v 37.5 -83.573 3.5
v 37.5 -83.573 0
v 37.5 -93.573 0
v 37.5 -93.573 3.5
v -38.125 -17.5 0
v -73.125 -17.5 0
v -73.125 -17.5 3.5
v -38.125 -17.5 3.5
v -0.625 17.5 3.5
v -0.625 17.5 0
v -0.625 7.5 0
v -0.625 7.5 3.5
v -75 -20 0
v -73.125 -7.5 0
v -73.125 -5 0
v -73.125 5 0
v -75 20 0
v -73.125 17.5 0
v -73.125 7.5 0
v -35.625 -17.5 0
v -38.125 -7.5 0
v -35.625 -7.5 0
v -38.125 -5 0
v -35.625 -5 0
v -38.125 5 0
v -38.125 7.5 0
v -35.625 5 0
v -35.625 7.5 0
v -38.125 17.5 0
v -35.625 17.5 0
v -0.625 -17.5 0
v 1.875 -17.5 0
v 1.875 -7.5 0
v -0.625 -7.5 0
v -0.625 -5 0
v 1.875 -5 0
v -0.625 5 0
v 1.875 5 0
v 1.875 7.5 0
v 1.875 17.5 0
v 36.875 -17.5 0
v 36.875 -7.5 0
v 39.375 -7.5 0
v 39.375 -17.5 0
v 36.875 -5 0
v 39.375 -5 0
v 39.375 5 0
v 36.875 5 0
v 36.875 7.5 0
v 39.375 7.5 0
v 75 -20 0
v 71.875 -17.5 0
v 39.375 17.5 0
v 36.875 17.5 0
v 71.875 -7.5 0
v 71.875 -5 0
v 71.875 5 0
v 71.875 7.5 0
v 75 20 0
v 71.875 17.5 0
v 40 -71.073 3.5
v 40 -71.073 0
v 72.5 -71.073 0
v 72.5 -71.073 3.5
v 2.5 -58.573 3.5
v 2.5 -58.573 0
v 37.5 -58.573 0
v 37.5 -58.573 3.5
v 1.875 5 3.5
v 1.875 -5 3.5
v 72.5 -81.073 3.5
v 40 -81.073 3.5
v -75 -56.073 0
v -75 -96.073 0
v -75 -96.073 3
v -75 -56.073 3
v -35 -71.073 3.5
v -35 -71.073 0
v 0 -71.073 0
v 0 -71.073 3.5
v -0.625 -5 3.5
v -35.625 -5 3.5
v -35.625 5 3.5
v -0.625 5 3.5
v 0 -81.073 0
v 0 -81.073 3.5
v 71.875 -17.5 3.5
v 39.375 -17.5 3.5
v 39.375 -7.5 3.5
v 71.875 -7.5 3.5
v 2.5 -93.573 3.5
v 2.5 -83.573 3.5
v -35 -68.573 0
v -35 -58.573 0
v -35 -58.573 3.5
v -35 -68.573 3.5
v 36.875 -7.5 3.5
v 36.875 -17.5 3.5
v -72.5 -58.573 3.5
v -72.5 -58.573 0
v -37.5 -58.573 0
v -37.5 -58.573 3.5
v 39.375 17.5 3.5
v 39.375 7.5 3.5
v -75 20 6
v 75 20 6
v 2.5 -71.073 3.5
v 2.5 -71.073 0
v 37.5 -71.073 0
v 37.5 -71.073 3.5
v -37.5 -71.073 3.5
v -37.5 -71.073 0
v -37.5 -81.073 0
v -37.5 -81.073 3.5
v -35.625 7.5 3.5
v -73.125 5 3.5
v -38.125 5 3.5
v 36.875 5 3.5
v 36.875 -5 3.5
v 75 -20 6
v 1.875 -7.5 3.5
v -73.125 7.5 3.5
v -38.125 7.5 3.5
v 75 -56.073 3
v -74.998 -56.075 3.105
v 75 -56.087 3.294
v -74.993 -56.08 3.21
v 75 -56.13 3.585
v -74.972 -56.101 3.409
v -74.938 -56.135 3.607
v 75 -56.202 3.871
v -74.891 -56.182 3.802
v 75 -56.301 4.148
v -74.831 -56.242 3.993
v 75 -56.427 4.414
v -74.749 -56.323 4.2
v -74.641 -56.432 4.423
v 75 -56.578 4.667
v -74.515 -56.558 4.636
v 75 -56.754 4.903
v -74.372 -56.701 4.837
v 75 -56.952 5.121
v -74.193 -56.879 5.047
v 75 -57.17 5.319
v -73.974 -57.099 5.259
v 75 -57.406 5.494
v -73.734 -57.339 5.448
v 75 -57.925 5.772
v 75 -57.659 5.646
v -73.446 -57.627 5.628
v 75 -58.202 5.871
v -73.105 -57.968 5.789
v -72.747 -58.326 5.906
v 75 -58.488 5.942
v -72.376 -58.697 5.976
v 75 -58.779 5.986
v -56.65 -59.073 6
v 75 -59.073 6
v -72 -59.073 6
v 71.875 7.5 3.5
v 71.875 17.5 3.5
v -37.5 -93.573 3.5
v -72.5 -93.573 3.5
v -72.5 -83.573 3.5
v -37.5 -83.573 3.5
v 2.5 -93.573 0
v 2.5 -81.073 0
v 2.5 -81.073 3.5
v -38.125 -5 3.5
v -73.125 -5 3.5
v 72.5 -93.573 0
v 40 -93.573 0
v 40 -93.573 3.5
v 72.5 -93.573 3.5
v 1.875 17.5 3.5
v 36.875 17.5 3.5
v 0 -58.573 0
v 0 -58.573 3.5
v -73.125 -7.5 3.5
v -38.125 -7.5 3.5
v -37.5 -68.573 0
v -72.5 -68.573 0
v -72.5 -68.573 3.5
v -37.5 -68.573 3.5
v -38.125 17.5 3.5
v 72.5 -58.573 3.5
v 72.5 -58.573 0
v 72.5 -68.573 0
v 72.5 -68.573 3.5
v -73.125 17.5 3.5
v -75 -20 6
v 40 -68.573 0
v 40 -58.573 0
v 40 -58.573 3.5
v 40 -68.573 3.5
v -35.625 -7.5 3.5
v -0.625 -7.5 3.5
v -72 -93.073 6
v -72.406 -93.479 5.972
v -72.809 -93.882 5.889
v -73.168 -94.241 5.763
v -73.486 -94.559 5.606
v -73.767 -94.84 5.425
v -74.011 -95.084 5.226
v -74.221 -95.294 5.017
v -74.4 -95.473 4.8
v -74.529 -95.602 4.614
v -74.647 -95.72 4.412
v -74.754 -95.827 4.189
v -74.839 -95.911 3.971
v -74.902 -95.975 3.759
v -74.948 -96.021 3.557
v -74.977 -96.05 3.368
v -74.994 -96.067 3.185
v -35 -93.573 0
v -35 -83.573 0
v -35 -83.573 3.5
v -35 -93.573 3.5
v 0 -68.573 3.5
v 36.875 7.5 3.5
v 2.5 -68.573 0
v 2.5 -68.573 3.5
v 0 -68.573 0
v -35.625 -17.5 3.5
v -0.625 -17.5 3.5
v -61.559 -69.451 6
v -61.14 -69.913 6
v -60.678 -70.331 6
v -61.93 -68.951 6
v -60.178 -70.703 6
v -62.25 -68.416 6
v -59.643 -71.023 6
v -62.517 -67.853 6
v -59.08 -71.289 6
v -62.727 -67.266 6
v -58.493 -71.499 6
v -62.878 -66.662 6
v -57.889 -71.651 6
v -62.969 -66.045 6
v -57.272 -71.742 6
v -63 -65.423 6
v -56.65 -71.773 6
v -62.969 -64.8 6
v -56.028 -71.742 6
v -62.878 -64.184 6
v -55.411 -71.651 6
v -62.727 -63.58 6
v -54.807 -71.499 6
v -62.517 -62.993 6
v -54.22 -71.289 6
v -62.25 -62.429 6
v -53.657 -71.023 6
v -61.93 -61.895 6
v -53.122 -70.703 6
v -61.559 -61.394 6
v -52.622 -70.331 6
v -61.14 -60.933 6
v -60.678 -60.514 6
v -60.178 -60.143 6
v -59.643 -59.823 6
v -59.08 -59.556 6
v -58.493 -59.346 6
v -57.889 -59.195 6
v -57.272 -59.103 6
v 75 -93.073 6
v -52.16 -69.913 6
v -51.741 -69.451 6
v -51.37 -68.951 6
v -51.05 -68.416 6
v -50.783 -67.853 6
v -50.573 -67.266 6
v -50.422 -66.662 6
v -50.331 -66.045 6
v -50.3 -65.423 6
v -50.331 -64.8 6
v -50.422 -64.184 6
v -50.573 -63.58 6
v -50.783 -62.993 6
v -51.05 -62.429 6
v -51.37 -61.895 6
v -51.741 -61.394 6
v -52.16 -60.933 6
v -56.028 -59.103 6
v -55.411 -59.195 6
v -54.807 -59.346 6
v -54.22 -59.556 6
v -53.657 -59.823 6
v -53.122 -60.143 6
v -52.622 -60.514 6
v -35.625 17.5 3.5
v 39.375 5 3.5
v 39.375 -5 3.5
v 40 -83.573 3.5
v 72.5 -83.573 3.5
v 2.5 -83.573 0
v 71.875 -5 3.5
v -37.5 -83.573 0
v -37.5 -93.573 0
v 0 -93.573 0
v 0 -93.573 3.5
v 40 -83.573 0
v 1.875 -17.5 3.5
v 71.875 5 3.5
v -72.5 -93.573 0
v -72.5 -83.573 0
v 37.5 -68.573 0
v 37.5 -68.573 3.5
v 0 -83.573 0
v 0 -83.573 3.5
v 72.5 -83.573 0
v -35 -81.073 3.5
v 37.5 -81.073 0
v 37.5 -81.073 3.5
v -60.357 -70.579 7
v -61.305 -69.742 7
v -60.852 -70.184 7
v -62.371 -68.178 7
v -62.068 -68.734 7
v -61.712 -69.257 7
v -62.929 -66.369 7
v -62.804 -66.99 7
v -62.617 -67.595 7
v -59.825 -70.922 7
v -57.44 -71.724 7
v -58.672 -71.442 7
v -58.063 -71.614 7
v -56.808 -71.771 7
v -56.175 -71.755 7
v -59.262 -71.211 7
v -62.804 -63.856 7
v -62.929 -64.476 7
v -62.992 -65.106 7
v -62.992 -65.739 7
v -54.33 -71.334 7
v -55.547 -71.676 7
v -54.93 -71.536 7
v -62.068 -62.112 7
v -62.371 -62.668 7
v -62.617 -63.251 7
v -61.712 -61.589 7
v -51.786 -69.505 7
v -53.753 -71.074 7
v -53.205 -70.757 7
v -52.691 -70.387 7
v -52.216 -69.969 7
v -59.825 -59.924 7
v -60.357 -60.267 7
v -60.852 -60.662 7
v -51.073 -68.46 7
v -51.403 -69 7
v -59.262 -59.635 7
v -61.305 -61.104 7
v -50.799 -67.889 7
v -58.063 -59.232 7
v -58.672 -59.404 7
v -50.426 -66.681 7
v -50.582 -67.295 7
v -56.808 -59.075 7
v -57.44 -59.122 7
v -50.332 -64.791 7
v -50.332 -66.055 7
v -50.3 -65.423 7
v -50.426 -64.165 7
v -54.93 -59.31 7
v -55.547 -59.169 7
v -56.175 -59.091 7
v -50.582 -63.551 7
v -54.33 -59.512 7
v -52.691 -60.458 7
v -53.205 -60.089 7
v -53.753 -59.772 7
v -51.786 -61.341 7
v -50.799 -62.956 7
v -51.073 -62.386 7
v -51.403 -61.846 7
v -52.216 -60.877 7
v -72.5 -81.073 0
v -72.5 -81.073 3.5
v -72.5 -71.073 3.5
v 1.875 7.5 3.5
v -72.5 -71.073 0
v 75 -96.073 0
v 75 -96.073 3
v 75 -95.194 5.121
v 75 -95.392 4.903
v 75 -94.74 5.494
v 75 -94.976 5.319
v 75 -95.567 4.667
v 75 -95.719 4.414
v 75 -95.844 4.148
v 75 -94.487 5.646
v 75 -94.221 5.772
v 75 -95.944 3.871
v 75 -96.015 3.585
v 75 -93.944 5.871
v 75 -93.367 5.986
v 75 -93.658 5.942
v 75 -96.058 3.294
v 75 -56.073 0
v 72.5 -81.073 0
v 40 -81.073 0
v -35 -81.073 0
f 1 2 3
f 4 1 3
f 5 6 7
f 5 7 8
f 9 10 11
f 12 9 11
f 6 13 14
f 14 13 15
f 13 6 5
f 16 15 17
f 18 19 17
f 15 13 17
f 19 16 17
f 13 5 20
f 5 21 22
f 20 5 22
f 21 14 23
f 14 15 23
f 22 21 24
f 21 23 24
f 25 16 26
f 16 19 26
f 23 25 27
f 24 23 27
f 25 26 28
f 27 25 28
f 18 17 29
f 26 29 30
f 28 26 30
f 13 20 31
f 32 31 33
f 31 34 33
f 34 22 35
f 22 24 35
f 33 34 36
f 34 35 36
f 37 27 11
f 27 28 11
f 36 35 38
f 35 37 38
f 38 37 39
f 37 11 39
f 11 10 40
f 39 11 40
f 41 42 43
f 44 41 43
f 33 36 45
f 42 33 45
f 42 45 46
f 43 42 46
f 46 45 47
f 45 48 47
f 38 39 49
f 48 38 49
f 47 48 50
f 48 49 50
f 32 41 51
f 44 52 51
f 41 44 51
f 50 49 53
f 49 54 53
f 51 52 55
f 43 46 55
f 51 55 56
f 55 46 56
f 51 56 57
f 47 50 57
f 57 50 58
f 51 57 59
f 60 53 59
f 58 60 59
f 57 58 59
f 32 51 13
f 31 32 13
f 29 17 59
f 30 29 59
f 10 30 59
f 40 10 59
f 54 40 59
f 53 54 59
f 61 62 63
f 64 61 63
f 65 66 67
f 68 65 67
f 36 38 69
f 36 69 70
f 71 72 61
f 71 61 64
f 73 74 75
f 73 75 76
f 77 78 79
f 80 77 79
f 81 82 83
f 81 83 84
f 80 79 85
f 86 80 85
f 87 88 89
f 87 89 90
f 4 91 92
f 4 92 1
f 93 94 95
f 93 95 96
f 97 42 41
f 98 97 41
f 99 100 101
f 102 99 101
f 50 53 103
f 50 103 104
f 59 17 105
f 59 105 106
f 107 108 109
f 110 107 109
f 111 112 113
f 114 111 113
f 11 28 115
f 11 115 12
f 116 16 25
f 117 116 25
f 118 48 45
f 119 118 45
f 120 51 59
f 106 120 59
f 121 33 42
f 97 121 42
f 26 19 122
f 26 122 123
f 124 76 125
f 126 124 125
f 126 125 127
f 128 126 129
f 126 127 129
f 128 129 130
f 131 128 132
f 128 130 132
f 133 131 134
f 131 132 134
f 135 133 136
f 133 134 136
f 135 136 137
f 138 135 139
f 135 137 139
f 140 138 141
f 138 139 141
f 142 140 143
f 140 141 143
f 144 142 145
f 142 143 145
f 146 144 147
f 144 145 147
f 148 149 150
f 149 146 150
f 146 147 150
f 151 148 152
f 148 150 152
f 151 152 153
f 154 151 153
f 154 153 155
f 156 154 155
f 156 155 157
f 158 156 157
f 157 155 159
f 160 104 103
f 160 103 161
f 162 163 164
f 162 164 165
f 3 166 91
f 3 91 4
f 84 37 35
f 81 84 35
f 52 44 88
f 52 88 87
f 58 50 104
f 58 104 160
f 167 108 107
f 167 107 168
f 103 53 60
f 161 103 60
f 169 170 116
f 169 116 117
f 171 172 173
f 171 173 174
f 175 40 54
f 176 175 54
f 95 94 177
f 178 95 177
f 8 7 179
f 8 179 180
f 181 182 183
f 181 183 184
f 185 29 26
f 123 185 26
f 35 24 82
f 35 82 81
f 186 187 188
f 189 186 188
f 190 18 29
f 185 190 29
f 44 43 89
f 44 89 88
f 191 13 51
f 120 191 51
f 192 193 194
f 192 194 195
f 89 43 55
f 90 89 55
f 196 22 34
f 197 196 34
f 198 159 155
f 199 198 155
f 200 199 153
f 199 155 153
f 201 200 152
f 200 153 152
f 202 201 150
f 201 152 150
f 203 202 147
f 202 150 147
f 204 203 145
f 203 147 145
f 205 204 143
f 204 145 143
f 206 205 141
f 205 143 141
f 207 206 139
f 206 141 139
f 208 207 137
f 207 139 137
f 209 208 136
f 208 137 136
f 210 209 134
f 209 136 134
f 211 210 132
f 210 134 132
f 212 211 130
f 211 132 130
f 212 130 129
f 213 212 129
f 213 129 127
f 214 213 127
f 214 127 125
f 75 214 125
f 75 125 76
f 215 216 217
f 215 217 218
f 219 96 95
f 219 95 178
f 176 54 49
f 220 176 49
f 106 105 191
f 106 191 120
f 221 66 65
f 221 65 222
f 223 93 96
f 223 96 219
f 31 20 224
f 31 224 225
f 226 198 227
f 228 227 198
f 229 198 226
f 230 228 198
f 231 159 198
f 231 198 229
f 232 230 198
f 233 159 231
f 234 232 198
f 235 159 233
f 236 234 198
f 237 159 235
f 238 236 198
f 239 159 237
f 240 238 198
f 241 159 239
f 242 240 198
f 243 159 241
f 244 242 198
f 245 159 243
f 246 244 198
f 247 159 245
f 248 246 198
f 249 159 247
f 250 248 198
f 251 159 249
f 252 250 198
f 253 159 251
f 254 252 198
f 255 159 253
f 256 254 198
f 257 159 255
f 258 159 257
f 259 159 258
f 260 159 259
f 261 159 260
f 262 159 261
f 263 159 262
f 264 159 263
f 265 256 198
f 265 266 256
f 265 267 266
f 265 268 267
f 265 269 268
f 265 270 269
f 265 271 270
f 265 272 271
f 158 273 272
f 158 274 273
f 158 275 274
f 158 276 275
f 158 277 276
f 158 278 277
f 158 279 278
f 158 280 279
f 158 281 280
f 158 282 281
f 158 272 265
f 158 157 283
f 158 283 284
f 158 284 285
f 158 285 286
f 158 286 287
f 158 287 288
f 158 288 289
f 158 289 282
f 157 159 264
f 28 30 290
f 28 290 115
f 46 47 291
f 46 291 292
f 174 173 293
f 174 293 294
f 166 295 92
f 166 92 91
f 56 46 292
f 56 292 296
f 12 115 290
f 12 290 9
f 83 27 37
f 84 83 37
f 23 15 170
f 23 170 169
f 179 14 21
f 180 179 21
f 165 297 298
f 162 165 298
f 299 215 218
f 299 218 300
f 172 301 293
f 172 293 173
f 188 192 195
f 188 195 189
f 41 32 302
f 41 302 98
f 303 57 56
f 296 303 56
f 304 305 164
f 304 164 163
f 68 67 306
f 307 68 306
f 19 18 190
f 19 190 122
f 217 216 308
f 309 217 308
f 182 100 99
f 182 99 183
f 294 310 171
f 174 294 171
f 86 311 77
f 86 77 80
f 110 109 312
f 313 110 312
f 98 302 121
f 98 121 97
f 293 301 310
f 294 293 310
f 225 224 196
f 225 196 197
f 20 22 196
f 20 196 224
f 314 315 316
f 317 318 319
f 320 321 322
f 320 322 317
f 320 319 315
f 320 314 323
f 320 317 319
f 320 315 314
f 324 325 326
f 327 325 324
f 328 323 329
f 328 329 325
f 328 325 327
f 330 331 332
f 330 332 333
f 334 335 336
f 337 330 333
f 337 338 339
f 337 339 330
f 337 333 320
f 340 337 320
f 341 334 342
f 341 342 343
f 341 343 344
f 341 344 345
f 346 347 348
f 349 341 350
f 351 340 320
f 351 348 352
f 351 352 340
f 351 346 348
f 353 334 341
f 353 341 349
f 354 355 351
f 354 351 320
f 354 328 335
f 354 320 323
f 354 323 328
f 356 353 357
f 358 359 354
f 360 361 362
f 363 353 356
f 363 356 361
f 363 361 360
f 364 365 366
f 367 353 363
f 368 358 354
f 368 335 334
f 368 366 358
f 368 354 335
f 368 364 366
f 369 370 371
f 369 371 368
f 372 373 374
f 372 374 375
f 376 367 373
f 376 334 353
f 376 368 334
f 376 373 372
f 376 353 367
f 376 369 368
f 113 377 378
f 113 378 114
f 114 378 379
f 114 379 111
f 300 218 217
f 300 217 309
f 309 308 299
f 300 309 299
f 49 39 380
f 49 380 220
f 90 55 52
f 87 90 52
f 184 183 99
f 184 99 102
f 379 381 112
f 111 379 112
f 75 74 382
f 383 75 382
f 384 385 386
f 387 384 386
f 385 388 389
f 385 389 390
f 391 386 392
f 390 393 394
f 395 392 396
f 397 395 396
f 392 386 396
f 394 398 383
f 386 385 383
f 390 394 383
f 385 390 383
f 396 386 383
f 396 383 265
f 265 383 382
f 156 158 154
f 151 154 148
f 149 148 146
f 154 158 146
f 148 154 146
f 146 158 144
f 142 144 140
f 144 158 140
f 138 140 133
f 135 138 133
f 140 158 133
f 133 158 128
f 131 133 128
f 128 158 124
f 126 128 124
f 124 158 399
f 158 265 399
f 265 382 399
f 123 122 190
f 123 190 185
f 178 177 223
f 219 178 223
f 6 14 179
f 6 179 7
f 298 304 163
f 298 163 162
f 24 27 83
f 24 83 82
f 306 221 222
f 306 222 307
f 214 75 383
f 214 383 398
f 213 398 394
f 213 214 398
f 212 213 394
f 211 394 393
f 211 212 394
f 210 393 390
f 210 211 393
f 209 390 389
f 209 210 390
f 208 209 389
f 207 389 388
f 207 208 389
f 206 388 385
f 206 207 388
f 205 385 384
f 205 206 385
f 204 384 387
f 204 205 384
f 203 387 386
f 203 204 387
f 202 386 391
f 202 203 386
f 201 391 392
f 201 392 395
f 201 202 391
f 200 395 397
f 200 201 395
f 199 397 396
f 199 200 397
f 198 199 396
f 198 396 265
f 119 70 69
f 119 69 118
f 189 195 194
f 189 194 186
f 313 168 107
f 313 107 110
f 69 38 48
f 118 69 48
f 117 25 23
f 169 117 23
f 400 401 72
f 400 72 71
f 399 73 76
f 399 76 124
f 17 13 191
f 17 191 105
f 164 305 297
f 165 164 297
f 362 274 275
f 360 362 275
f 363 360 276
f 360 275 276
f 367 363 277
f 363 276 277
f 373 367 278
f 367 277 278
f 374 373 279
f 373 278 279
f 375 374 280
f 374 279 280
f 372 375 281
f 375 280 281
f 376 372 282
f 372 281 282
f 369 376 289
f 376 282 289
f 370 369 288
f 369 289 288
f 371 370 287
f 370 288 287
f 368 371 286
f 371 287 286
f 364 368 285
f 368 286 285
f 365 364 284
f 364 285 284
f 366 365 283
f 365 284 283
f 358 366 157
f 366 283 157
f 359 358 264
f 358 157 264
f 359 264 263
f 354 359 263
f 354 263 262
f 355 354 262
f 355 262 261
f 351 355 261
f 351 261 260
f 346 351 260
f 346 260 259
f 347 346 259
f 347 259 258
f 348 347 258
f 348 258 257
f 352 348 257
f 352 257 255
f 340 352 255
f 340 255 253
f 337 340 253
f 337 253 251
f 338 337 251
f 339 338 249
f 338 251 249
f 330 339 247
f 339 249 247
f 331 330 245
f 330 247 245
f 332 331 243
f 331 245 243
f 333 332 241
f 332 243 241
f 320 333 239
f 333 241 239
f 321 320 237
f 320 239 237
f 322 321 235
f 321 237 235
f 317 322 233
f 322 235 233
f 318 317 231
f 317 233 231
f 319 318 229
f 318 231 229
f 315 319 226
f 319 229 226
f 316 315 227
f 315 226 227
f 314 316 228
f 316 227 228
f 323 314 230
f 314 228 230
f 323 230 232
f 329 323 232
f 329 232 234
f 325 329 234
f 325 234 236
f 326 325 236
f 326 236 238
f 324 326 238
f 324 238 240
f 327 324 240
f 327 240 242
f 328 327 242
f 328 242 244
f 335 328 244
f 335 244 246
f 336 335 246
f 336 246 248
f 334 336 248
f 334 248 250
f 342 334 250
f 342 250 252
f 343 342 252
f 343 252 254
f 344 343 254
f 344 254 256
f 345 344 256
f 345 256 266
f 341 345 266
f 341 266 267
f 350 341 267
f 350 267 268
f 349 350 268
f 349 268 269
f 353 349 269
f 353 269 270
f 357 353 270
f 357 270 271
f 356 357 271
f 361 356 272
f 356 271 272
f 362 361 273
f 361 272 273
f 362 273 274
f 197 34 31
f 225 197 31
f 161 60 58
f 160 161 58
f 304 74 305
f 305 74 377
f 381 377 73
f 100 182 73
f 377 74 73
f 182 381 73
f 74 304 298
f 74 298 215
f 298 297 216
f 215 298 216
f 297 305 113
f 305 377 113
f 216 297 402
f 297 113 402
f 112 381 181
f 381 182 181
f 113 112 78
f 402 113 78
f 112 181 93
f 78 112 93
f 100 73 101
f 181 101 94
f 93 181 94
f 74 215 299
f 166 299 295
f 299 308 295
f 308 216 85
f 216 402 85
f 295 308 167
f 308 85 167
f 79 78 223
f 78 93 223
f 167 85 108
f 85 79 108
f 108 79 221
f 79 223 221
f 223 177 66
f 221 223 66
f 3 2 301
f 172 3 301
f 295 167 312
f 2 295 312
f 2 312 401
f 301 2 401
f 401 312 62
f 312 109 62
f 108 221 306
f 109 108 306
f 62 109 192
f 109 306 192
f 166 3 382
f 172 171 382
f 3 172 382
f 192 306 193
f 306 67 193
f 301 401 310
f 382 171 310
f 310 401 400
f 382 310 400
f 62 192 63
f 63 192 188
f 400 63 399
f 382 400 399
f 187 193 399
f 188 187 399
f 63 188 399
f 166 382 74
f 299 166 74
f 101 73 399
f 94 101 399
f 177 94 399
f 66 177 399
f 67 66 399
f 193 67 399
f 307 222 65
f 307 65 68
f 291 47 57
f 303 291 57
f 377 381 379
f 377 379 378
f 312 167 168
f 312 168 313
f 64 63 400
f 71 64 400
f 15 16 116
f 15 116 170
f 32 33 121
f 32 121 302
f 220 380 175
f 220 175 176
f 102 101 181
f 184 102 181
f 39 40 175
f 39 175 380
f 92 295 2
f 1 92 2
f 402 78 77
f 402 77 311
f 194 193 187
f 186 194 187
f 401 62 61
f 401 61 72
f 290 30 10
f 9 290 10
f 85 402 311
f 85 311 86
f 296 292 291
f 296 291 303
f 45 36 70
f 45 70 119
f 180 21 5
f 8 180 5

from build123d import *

# Parameters (mm, degrees)
F0_W        = 150
F0_H        = 40
F1_DEPTH    = 6
F2_W        = 150
F2_H        = 40
F3_DEPTH    = 6
F4_R        = 6.35
F5_DEPTH    = 1
F6_W        = 35
F6_H        = 10
F6_W_2      = 32.5
F7_DEPTH    = 3.5
F8_T1_DEPTH = 165
F8_T3_DEPTH = 55
F9_W        = 32.5
F9_H        = 10
F9_W_2      = 35
F10_DEPTH   = 3.5


# Not quite as in the source:
# - a fillet or chamfer that OpenCascade refuses, or shapes differently, is made with other operations: its cross-section is extruded or revolved along the edge and cut away or added


with BuildPart() as f1:
    # F0 (on Top) → F1 (new body)
    with BuildSketch(Plane.XY):
        Rectangle(F0_W, F0_H)
    extrude(amount=F1_DEPTH)

    # F9 (on face) → F10 (cut)
    with BuildSketch(Plane(origin=(0, 0, 0), x_dir=(1, 0, 0), z_dir=(0, 0, -1))):
        with Locations((55.625, -12.5)):
            Rectangle(F9_W, F9_H)
        with Locations((19.375, -12.5)):
            Rectangle(F9_W_2, F9_H)
        with Locations((55.625, 0)):
            Rectangle(F9_W, F9_H)
        with Locations((19.375, 0)):
            Rectangle(F9_W_2, F9_H)
        with Locations((55.625, 12.5)):
            Rectangle(F9_W, F9_H)
        with Locations((-18.125, -12.5)):
            Rectangle(F9_W_2, F9_H)
        with Locations((-55.625, -12.5)):
            Rectangle(F9_W_2, F9_H)
        with Locations((-55.625, 0)):
            Rectangle(F9_W_2, F9_H)
        with Locations((-55.625, 12.5)):
            Rectangle(F9_W_2, F9_H)
        with Locations((-18.125, 12.5)):
            Rectangle(F9_W_2, F9_H)
        with Locations((-18.125, 0)):
            Rectangle(F9_W_2, F9_H)
        with Locations((19.375, 12.5)):
            Rectangle(F9_W_2, F9_H)
    extrude(amount=-F10_DEPTH, mode=Mode.SUBTRACT)


with BuildPart() as f3:
    # F2 (on Top) → F3 (new body)
    with BuildSketch(Plane.XY):
        with Locations((0, -76.0728493333)):
            Rectangle(F2_W, F2_H)
    extrude(amount=F3_DEPTH)

    # F4 (on face) → F5 (join)
    with BuildSketch(Plane.XY.offset(6)):
        with Locations((-56.65, -65.4228493333)):
            Circle(F4_R)
    extrude(amount=F5_DEPTH)

    # F6 (on face) → F7 (cut)
    with BuildSketch(Plane(origin=(0, 0, 0), x_dir=(1, 0, 0), z_dir=(0, 0, -1))):
        with Locations((-55, 88.5728493333)):
            Rectangle(F6_W, F6_H)
        with Locations((-17.5, 88.5728493333)):
            Rectangle(F6_W, F6_H)
        with Locations((-17.5, 76.0728493333)):
            Rectangle(F6_W, F6_H)
        with Locations((-55, 76.0728493333)):
            Rectangle(F6_W, F6_H)
        with Locations((-55, 63.5728493333)):
            Rectangle(F6_W, F6_H)
        with Locations((20, 63.5728493333)):
            Rectangle(F6_W, F6_H)
        with Locations((20, 76.0728493333)):
            Rectangle(F6_W, F6_H)
        with Locations((20, 88.5728493333)):
            Rectangle(F6_W, F6_H)
        with Locations((-17.5, 63.5728493333)):
            Rectangle(F6_W, F6_H)
        with Locations((56.25, 88.5728493333)):
            Rectangle(F6_W_2, F6_H)
        with Locations((56.25, 76.0728493333)):
            Rectangle(F6_W_2, F6_H)
        with Locations((56.25, 63.5728493333)):
            Rectangle(F6_W_2, F6_H)
    extrude(amount=-F7_DEPTH, mode=Mode.SUBTRACT)

    # F8: fillet of radius 3 on 3 edges, made by hand

    # F8_s2 → F8_t1 (cut)
    with BuildSketch(Plane.YZ.offset(-82.5)):
        with BuildLine():
            ThreePointArc((-56.0728493333, 3), (-56.9515289897, 5.1213203436), (-59.0728493333, 6))
            Line((-59.0728493333, 6), (-56.0728493333, 6))
            Line((-56.0728493333, 6), (-56.0728493333, 3))
        make_face()
        with BuildLine():
            ThreePointArc((-96.0728493333, 3), (-95.1941696768, 5.1213203436), (-93.0728493333, 6))
            Line((-93.0728493333, 6), (-96.0728493333, 6))
            Line((-96.0728493333, 6), (-96.0728493333, 3))
        make_face()
    extrude(amount=F8_T1_DEPTH, mode=Mode.SUBTRACT)

    # F8_s4 → F8_t3 (cut)
    with BuildSketch(Plane.XZ.offset(48.5728493333)):
        with BuildLine():
            ThreePointArc((-72, 6), (-74.1213203436, 5.1213203436), (-75, 3))
            Line((-75, 3), (-75, 6))
            Line((-75, 6), (-72, 6))
        make_face()
    extrude(amount=F8_T3_DEPTH, mode=Mode.SUBTRACT)


solid = Compound([f1.part, f3.part])
